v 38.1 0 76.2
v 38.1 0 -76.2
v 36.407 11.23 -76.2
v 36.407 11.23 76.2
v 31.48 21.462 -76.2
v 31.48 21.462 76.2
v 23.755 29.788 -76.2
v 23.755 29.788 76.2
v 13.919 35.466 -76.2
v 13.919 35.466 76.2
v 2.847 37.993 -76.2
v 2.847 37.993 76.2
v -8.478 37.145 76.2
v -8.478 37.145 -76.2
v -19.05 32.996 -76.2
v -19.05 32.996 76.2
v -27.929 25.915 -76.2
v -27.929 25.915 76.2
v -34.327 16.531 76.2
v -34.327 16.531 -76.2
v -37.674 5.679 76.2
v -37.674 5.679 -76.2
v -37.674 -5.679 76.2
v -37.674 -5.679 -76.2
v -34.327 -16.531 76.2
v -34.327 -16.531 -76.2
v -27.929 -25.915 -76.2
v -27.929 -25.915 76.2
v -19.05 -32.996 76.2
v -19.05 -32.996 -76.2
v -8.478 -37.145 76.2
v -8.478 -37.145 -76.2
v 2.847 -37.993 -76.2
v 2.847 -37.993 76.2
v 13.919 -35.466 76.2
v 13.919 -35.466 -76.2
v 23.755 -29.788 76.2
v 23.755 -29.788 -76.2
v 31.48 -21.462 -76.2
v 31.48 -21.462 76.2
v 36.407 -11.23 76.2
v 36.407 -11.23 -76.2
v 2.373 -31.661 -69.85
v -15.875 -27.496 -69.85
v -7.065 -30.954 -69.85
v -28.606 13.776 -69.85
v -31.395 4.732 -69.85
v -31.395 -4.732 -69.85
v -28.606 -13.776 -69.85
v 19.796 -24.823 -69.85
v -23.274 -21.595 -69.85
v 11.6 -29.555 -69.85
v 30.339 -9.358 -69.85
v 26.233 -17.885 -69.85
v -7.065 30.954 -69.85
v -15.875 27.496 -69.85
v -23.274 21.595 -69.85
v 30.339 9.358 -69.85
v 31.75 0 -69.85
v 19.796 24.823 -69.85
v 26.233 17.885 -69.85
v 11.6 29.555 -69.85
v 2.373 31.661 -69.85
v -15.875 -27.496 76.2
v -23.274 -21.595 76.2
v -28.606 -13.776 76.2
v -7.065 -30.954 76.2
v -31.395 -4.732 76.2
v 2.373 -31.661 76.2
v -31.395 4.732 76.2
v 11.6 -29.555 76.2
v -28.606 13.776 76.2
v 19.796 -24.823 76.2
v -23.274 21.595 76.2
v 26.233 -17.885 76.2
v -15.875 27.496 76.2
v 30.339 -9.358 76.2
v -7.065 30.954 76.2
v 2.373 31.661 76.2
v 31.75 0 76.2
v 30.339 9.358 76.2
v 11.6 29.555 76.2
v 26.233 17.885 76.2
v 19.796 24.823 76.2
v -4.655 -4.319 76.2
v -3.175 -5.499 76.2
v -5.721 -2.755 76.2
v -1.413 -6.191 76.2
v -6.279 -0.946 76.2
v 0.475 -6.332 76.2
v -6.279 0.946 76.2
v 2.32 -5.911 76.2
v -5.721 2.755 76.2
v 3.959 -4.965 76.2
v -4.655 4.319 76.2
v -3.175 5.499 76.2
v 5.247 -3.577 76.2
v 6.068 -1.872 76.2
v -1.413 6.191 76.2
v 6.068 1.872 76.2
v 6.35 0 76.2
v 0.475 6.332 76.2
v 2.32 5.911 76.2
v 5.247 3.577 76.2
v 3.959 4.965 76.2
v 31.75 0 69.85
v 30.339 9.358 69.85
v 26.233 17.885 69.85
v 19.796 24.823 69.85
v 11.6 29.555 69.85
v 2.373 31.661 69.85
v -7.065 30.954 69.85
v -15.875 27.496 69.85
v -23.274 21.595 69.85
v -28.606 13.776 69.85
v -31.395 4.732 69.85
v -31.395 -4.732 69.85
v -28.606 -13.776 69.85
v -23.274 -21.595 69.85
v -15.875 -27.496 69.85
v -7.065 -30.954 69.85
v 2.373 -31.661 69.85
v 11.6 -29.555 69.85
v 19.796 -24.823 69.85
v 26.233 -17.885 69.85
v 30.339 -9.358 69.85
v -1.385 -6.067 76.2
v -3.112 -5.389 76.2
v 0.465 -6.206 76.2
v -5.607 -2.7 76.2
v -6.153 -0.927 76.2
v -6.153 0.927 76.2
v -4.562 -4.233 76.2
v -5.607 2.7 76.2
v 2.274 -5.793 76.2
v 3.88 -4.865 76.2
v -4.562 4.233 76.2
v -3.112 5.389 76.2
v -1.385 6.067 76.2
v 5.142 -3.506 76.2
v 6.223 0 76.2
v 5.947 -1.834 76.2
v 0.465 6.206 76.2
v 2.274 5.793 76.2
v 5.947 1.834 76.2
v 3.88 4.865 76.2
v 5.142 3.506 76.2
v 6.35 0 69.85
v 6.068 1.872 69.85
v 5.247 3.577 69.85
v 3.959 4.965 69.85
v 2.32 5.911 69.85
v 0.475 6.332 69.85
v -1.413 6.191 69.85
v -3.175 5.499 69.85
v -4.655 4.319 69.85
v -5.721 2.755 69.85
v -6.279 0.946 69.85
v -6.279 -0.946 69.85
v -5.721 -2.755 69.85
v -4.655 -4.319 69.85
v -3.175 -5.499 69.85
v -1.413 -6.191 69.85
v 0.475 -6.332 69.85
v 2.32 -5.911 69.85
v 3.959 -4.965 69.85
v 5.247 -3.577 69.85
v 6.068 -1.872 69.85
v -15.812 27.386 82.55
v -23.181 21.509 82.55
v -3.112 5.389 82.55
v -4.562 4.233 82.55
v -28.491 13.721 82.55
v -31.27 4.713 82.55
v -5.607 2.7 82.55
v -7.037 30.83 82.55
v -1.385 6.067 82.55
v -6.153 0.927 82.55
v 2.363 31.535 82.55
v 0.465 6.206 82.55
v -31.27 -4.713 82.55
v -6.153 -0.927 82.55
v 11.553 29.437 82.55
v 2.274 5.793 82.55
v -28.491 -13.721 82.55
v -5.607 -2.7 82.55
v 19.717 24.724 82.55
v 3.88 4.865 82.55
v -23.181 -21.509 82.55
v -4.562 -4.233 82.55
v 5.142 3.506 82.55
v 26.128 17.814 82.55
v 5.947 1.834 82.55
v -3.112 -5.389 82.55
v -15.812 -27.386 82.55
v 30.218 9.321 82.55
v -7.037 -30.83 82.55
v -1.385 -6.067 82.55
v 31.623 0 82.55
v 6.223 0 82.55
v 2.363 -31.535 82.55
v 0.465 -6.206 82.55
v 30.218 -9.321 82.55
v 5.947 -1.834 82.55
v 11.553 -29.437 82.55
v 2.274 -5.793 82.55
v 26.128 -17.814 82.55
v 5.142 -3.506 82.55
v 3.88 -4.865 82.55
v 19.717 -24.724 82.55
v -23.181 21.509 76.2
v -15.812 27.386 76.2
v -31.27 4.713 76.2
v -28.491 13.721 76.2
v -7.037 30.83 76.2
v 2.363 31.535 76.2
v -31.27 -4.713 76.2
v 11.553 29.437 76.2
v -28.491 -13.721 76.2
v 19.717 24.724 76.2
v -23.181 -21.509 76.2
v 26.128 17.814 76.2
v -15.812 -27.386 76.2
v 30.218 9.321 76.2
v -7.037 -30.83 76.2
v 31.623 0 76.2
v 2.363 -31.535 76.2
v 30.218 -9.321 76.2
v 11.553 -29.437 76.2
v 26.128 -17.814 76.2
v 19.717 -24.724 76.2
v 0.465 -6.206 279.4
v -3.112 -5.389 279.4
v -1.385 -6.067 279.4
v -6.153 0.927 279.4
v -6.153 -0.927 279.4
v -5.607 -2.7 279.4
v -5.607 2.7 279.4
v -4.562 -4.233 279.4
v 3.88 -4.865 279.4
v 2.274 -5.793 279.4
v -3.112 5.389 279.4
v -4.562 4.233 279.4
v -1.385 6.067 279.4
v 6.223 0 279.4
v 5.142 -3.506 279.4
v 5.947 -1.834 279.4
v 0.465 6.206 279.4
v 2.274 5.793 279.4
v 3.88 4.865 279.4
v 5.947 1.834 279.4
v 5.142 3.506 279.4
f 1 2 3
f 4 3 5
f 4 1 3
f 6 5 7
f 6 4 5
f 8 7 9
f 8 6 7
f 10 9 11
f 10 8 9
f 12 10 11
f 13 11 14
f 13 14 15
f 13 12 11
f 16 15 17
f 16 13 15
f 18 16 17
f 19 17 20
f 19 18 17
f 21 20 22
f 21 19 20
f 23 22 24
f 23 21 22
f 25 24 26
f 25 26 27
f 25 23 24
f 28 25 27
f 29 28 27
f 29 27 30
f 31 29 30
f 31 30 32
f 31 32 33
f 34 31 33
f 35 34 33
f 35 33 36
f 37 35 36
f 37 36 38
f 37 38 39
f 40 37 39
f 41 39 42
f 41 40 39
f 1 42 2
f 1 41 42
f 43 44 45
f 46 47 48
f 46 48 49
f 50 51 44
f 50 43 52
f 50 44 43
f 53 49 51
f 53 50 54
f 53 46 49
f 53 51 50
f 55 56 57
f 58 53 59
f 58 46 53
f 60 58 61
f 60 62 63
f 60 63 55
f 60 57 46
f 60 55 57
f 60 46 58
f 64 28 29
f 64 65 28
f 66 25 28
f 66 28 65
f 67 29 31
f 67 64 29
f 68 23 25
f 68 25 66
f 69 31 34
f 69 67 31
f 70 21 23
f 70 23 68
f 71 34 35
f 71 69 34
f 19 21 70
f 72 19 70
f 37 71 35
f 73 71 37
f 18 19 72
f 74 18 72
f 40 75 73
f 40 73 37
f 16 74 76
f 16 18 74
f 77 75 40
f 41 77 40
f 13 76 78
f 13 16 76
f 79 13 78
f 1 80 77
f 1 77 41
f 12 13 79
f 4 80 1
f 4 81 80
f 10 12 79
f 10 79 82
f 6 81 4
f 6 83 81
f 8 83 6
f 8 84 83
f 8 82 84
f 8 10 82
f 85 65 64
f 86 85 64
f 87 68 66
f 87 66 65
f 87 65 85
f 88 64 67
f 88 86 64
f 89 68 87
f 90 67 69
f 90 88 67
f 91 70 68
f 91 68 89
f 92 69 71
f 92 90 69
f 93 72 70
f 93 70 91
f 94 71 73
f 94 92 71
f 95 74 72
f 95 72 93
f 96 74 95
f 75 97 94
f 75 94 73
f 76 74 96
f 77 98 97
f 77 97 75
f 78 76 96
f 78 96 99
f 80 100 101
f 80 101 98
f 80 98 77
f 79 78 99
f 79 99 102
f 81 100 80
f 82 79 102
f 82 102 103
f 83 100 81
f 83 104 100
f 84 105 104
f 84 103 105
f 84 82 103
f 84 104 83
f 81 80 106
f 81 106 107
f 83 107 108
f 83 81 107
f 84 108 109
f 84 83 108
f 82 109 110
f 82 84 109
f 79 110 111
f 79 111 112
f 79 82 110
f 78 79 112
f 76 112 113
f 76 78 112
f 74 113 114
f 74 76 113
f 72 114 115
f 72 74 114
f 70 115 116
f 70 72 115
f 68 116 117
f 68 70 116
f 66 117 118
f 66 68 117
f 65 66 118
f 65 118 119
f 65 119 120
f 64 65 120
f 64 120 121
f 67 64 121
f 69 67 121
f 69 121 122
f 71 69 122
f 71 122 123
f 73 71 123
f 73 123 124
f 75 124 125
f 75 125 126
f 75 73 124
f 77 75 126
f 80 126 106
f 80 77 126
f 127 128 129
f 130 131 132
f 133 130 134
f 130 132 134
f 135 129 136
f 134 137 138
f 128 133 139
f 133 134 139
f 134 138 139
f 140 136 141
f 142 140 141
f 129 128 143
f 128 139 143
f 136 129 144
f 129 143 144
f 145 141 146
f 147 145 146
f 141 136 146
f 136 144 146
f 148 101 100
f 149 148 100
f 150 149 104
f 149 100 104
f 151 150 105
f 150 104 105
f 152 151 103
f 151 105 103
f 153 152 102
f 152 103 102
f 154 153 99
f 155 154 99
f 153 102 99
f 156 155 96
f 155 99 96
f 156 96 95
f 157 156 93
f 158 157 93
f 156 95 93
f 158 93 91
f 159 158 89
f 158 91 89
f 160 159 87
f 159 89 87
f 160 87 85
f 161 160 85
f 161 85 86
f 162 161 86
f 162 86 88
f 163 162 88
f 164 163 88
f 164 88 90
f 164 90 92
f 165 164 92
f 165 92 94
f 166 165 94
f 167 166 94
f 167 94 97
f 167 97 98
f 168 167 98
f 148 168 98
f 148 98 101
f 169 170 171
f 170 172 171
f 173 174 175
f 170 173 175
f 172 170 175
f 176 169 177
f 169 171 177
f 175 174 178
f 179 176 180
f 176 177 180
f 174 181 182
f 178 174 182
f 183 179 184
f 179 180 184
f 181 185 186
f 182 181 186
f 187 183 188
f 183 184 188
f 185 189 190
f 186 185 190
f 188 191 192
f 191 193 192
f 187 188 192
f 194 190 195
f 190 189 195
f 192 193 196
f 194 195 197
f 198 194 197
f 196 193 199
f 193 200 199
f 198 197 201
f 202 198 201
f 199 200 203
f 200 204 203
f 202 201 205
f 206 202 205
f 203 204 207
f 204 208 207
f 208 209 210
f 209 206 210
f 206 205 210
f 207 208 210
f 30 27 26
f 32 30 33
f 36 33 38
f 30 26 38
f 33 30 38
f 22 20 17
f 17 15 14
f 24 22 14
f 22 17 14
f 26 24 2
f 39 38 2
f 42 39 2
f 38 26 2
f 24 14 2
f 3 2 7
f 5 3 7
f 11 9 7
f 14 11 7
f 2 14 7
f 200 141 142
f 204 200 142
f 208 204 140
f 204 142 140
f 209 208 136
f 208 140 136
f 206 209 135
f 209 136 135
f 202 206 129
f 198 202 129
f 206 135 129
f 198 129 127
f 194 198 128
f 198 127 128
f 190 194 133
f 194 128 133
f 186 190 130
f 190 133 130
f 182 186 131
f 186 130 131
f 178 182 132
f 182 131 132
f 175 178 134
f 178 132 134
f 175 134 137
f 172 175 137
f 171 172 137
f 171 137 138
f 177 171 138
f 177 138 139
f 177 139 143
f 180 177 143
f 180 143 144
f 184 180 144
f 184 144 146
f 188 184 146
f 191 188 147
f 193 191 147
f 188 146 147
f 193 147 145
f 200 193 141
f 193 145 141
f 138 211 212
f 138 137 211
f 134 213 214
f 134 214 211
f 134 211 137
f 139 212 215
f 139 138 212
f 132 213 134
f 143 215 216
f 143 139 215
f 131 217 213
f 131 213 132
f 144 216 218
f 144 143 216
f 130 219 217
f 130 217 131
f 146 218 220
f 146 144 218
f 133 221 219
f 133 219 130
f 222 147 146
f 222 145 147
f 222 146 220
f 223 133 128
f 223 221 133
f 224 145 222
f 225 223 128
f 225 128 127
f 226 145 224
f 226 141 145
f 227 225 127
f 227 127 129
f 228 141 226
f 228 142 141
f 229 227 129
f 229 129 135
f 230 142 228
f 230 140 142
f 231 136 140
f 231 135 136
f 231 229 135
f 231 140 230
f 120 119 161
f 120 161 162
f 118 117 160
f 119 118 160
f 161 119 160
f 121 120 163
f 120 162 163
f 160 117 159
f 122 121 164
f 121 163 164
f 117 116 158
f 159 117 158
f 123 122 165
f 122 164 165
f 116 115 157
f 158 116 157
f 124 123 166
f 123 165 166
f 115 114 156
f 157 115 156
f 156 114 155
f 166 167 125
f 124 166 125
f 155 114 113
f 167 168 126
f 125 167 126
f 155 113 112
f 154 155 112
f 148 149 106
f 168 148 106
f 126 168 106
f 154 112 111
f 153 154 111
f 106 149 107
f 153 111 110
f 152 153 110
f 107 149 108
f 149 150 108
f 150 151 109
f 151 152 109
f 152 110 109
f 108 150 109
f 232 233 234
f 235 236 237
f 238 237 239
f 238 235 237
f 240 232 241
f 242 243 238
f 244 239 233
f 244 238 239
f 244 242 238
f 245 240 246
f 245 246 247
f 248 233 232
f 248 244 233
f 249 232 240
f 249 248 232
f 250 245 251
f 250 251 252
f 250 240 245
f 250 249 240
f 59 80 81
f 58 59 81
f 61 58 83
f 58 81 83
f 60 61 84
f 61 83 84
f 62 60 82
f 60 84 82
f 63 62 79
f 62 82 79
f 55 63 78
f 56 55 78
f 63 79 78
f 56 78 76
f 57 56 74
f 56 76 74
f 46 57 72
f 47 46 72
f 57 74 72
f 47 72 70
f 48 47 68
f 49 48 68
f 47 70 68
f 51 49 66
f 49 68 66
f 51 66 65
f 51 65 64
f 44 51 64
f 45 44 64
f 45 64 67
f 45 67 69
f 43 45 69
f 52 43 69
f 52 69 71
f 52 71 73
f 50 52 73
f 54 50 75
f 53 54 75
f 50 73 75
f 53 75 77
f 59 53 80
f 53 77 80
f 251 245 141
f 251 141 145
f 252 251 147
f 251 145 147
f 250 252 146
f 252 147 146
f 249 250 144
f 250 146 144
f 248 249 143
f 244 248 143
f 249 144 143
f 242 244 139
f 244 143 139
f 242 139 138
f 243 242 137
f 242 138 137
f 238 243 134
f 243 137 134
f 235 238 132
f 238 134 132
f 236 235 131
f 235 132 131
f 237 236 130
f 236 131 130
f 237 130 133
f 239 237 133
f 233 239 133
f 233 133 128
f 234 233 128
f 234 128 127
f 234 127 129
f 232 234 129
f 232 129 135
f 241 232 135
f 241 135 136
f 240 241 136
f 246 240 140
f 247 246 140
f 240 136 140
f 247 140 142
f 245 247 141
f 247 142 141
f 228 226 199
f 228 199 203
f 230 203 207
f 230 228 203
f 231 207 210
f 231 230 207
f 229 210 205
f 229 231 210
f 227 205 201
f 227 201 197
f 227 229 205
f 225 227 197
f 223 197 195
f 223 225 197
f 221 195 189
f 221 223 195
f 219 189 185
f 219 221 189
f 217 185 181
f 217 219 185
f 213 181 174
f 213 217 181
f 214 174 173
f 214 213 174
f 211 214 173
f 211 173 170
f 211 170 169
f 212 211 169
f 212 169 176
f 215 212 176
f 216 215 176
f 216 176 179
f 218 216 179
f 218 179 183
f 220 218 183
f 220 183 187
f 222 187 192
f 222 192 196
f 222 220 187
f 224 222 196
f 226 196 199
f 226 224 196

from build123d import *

# Parameters (mm, degrees)
F0_R      = 38.1
F1_DEPTH  = 76.2
F2_T      = -6.35
F3_R      = 31.75
F4_DEPTH  = 6.35
F5_R      = 6.35
F6_DEPTH  = 152.401
F7_R      = 6.223
F8_DEPTH  = 203.2
F9_R      = 31.623
F9_R_2    = 6.223
F10_DEPTH = 6.35


with BuildPart() as f1:
    # F0 (on Top) → F1 (new body, symmetric)
    with BuildSketch(Plane.XY):
        Circle(F0_R)
    extrude(amount=F1_DEPTH, both=True)

    # F2
    f2_openings = [f1.faces().sort_by_distance(p)[0] for p in [
        (0, 0, 76.2),
    ]]
    offset(amount=F2_T, openings=f2_openings)


with BuildPart() as f4:
    # F3 (on face) → F4 (new body)
    with BuildSketch(Plane.XY.offset(76.2)):
        Circle(F3_R)
    extrude(amount=-F4_DEPTH)

    # F5 (on face) → F6 (cut, through all)
    with BuildSketch(Plane.XY.offset(76.2)):
        Circle(F5_R)
    extrude(amount=-F6_DEPTH, mode=Mode.SUBTRACT)


with BuildPart() as f8:
    # F7 (on face) → F8 (new body)
    with BuildSketch(Plane.XY.offset(76.2)):
        Circle(F7_R)
    extrude(amount=F8_DEPTH)


with BuildPart() as f10:
    # F9 (on face) → F10 (new body)
    with BuildSketch(Plane(origin=(0, 0, 76.2), x_dir=(1, 0, 0), z_dir=(0, 0, -1))):
        Circle(F9_R)
        Circle(F9_R_2, mode=Mode.SUBTRACT)
    extrude(amount=-F10_DEPTH)


solid = Compound([f1.part, f4.part, f8.part, f10.part])
